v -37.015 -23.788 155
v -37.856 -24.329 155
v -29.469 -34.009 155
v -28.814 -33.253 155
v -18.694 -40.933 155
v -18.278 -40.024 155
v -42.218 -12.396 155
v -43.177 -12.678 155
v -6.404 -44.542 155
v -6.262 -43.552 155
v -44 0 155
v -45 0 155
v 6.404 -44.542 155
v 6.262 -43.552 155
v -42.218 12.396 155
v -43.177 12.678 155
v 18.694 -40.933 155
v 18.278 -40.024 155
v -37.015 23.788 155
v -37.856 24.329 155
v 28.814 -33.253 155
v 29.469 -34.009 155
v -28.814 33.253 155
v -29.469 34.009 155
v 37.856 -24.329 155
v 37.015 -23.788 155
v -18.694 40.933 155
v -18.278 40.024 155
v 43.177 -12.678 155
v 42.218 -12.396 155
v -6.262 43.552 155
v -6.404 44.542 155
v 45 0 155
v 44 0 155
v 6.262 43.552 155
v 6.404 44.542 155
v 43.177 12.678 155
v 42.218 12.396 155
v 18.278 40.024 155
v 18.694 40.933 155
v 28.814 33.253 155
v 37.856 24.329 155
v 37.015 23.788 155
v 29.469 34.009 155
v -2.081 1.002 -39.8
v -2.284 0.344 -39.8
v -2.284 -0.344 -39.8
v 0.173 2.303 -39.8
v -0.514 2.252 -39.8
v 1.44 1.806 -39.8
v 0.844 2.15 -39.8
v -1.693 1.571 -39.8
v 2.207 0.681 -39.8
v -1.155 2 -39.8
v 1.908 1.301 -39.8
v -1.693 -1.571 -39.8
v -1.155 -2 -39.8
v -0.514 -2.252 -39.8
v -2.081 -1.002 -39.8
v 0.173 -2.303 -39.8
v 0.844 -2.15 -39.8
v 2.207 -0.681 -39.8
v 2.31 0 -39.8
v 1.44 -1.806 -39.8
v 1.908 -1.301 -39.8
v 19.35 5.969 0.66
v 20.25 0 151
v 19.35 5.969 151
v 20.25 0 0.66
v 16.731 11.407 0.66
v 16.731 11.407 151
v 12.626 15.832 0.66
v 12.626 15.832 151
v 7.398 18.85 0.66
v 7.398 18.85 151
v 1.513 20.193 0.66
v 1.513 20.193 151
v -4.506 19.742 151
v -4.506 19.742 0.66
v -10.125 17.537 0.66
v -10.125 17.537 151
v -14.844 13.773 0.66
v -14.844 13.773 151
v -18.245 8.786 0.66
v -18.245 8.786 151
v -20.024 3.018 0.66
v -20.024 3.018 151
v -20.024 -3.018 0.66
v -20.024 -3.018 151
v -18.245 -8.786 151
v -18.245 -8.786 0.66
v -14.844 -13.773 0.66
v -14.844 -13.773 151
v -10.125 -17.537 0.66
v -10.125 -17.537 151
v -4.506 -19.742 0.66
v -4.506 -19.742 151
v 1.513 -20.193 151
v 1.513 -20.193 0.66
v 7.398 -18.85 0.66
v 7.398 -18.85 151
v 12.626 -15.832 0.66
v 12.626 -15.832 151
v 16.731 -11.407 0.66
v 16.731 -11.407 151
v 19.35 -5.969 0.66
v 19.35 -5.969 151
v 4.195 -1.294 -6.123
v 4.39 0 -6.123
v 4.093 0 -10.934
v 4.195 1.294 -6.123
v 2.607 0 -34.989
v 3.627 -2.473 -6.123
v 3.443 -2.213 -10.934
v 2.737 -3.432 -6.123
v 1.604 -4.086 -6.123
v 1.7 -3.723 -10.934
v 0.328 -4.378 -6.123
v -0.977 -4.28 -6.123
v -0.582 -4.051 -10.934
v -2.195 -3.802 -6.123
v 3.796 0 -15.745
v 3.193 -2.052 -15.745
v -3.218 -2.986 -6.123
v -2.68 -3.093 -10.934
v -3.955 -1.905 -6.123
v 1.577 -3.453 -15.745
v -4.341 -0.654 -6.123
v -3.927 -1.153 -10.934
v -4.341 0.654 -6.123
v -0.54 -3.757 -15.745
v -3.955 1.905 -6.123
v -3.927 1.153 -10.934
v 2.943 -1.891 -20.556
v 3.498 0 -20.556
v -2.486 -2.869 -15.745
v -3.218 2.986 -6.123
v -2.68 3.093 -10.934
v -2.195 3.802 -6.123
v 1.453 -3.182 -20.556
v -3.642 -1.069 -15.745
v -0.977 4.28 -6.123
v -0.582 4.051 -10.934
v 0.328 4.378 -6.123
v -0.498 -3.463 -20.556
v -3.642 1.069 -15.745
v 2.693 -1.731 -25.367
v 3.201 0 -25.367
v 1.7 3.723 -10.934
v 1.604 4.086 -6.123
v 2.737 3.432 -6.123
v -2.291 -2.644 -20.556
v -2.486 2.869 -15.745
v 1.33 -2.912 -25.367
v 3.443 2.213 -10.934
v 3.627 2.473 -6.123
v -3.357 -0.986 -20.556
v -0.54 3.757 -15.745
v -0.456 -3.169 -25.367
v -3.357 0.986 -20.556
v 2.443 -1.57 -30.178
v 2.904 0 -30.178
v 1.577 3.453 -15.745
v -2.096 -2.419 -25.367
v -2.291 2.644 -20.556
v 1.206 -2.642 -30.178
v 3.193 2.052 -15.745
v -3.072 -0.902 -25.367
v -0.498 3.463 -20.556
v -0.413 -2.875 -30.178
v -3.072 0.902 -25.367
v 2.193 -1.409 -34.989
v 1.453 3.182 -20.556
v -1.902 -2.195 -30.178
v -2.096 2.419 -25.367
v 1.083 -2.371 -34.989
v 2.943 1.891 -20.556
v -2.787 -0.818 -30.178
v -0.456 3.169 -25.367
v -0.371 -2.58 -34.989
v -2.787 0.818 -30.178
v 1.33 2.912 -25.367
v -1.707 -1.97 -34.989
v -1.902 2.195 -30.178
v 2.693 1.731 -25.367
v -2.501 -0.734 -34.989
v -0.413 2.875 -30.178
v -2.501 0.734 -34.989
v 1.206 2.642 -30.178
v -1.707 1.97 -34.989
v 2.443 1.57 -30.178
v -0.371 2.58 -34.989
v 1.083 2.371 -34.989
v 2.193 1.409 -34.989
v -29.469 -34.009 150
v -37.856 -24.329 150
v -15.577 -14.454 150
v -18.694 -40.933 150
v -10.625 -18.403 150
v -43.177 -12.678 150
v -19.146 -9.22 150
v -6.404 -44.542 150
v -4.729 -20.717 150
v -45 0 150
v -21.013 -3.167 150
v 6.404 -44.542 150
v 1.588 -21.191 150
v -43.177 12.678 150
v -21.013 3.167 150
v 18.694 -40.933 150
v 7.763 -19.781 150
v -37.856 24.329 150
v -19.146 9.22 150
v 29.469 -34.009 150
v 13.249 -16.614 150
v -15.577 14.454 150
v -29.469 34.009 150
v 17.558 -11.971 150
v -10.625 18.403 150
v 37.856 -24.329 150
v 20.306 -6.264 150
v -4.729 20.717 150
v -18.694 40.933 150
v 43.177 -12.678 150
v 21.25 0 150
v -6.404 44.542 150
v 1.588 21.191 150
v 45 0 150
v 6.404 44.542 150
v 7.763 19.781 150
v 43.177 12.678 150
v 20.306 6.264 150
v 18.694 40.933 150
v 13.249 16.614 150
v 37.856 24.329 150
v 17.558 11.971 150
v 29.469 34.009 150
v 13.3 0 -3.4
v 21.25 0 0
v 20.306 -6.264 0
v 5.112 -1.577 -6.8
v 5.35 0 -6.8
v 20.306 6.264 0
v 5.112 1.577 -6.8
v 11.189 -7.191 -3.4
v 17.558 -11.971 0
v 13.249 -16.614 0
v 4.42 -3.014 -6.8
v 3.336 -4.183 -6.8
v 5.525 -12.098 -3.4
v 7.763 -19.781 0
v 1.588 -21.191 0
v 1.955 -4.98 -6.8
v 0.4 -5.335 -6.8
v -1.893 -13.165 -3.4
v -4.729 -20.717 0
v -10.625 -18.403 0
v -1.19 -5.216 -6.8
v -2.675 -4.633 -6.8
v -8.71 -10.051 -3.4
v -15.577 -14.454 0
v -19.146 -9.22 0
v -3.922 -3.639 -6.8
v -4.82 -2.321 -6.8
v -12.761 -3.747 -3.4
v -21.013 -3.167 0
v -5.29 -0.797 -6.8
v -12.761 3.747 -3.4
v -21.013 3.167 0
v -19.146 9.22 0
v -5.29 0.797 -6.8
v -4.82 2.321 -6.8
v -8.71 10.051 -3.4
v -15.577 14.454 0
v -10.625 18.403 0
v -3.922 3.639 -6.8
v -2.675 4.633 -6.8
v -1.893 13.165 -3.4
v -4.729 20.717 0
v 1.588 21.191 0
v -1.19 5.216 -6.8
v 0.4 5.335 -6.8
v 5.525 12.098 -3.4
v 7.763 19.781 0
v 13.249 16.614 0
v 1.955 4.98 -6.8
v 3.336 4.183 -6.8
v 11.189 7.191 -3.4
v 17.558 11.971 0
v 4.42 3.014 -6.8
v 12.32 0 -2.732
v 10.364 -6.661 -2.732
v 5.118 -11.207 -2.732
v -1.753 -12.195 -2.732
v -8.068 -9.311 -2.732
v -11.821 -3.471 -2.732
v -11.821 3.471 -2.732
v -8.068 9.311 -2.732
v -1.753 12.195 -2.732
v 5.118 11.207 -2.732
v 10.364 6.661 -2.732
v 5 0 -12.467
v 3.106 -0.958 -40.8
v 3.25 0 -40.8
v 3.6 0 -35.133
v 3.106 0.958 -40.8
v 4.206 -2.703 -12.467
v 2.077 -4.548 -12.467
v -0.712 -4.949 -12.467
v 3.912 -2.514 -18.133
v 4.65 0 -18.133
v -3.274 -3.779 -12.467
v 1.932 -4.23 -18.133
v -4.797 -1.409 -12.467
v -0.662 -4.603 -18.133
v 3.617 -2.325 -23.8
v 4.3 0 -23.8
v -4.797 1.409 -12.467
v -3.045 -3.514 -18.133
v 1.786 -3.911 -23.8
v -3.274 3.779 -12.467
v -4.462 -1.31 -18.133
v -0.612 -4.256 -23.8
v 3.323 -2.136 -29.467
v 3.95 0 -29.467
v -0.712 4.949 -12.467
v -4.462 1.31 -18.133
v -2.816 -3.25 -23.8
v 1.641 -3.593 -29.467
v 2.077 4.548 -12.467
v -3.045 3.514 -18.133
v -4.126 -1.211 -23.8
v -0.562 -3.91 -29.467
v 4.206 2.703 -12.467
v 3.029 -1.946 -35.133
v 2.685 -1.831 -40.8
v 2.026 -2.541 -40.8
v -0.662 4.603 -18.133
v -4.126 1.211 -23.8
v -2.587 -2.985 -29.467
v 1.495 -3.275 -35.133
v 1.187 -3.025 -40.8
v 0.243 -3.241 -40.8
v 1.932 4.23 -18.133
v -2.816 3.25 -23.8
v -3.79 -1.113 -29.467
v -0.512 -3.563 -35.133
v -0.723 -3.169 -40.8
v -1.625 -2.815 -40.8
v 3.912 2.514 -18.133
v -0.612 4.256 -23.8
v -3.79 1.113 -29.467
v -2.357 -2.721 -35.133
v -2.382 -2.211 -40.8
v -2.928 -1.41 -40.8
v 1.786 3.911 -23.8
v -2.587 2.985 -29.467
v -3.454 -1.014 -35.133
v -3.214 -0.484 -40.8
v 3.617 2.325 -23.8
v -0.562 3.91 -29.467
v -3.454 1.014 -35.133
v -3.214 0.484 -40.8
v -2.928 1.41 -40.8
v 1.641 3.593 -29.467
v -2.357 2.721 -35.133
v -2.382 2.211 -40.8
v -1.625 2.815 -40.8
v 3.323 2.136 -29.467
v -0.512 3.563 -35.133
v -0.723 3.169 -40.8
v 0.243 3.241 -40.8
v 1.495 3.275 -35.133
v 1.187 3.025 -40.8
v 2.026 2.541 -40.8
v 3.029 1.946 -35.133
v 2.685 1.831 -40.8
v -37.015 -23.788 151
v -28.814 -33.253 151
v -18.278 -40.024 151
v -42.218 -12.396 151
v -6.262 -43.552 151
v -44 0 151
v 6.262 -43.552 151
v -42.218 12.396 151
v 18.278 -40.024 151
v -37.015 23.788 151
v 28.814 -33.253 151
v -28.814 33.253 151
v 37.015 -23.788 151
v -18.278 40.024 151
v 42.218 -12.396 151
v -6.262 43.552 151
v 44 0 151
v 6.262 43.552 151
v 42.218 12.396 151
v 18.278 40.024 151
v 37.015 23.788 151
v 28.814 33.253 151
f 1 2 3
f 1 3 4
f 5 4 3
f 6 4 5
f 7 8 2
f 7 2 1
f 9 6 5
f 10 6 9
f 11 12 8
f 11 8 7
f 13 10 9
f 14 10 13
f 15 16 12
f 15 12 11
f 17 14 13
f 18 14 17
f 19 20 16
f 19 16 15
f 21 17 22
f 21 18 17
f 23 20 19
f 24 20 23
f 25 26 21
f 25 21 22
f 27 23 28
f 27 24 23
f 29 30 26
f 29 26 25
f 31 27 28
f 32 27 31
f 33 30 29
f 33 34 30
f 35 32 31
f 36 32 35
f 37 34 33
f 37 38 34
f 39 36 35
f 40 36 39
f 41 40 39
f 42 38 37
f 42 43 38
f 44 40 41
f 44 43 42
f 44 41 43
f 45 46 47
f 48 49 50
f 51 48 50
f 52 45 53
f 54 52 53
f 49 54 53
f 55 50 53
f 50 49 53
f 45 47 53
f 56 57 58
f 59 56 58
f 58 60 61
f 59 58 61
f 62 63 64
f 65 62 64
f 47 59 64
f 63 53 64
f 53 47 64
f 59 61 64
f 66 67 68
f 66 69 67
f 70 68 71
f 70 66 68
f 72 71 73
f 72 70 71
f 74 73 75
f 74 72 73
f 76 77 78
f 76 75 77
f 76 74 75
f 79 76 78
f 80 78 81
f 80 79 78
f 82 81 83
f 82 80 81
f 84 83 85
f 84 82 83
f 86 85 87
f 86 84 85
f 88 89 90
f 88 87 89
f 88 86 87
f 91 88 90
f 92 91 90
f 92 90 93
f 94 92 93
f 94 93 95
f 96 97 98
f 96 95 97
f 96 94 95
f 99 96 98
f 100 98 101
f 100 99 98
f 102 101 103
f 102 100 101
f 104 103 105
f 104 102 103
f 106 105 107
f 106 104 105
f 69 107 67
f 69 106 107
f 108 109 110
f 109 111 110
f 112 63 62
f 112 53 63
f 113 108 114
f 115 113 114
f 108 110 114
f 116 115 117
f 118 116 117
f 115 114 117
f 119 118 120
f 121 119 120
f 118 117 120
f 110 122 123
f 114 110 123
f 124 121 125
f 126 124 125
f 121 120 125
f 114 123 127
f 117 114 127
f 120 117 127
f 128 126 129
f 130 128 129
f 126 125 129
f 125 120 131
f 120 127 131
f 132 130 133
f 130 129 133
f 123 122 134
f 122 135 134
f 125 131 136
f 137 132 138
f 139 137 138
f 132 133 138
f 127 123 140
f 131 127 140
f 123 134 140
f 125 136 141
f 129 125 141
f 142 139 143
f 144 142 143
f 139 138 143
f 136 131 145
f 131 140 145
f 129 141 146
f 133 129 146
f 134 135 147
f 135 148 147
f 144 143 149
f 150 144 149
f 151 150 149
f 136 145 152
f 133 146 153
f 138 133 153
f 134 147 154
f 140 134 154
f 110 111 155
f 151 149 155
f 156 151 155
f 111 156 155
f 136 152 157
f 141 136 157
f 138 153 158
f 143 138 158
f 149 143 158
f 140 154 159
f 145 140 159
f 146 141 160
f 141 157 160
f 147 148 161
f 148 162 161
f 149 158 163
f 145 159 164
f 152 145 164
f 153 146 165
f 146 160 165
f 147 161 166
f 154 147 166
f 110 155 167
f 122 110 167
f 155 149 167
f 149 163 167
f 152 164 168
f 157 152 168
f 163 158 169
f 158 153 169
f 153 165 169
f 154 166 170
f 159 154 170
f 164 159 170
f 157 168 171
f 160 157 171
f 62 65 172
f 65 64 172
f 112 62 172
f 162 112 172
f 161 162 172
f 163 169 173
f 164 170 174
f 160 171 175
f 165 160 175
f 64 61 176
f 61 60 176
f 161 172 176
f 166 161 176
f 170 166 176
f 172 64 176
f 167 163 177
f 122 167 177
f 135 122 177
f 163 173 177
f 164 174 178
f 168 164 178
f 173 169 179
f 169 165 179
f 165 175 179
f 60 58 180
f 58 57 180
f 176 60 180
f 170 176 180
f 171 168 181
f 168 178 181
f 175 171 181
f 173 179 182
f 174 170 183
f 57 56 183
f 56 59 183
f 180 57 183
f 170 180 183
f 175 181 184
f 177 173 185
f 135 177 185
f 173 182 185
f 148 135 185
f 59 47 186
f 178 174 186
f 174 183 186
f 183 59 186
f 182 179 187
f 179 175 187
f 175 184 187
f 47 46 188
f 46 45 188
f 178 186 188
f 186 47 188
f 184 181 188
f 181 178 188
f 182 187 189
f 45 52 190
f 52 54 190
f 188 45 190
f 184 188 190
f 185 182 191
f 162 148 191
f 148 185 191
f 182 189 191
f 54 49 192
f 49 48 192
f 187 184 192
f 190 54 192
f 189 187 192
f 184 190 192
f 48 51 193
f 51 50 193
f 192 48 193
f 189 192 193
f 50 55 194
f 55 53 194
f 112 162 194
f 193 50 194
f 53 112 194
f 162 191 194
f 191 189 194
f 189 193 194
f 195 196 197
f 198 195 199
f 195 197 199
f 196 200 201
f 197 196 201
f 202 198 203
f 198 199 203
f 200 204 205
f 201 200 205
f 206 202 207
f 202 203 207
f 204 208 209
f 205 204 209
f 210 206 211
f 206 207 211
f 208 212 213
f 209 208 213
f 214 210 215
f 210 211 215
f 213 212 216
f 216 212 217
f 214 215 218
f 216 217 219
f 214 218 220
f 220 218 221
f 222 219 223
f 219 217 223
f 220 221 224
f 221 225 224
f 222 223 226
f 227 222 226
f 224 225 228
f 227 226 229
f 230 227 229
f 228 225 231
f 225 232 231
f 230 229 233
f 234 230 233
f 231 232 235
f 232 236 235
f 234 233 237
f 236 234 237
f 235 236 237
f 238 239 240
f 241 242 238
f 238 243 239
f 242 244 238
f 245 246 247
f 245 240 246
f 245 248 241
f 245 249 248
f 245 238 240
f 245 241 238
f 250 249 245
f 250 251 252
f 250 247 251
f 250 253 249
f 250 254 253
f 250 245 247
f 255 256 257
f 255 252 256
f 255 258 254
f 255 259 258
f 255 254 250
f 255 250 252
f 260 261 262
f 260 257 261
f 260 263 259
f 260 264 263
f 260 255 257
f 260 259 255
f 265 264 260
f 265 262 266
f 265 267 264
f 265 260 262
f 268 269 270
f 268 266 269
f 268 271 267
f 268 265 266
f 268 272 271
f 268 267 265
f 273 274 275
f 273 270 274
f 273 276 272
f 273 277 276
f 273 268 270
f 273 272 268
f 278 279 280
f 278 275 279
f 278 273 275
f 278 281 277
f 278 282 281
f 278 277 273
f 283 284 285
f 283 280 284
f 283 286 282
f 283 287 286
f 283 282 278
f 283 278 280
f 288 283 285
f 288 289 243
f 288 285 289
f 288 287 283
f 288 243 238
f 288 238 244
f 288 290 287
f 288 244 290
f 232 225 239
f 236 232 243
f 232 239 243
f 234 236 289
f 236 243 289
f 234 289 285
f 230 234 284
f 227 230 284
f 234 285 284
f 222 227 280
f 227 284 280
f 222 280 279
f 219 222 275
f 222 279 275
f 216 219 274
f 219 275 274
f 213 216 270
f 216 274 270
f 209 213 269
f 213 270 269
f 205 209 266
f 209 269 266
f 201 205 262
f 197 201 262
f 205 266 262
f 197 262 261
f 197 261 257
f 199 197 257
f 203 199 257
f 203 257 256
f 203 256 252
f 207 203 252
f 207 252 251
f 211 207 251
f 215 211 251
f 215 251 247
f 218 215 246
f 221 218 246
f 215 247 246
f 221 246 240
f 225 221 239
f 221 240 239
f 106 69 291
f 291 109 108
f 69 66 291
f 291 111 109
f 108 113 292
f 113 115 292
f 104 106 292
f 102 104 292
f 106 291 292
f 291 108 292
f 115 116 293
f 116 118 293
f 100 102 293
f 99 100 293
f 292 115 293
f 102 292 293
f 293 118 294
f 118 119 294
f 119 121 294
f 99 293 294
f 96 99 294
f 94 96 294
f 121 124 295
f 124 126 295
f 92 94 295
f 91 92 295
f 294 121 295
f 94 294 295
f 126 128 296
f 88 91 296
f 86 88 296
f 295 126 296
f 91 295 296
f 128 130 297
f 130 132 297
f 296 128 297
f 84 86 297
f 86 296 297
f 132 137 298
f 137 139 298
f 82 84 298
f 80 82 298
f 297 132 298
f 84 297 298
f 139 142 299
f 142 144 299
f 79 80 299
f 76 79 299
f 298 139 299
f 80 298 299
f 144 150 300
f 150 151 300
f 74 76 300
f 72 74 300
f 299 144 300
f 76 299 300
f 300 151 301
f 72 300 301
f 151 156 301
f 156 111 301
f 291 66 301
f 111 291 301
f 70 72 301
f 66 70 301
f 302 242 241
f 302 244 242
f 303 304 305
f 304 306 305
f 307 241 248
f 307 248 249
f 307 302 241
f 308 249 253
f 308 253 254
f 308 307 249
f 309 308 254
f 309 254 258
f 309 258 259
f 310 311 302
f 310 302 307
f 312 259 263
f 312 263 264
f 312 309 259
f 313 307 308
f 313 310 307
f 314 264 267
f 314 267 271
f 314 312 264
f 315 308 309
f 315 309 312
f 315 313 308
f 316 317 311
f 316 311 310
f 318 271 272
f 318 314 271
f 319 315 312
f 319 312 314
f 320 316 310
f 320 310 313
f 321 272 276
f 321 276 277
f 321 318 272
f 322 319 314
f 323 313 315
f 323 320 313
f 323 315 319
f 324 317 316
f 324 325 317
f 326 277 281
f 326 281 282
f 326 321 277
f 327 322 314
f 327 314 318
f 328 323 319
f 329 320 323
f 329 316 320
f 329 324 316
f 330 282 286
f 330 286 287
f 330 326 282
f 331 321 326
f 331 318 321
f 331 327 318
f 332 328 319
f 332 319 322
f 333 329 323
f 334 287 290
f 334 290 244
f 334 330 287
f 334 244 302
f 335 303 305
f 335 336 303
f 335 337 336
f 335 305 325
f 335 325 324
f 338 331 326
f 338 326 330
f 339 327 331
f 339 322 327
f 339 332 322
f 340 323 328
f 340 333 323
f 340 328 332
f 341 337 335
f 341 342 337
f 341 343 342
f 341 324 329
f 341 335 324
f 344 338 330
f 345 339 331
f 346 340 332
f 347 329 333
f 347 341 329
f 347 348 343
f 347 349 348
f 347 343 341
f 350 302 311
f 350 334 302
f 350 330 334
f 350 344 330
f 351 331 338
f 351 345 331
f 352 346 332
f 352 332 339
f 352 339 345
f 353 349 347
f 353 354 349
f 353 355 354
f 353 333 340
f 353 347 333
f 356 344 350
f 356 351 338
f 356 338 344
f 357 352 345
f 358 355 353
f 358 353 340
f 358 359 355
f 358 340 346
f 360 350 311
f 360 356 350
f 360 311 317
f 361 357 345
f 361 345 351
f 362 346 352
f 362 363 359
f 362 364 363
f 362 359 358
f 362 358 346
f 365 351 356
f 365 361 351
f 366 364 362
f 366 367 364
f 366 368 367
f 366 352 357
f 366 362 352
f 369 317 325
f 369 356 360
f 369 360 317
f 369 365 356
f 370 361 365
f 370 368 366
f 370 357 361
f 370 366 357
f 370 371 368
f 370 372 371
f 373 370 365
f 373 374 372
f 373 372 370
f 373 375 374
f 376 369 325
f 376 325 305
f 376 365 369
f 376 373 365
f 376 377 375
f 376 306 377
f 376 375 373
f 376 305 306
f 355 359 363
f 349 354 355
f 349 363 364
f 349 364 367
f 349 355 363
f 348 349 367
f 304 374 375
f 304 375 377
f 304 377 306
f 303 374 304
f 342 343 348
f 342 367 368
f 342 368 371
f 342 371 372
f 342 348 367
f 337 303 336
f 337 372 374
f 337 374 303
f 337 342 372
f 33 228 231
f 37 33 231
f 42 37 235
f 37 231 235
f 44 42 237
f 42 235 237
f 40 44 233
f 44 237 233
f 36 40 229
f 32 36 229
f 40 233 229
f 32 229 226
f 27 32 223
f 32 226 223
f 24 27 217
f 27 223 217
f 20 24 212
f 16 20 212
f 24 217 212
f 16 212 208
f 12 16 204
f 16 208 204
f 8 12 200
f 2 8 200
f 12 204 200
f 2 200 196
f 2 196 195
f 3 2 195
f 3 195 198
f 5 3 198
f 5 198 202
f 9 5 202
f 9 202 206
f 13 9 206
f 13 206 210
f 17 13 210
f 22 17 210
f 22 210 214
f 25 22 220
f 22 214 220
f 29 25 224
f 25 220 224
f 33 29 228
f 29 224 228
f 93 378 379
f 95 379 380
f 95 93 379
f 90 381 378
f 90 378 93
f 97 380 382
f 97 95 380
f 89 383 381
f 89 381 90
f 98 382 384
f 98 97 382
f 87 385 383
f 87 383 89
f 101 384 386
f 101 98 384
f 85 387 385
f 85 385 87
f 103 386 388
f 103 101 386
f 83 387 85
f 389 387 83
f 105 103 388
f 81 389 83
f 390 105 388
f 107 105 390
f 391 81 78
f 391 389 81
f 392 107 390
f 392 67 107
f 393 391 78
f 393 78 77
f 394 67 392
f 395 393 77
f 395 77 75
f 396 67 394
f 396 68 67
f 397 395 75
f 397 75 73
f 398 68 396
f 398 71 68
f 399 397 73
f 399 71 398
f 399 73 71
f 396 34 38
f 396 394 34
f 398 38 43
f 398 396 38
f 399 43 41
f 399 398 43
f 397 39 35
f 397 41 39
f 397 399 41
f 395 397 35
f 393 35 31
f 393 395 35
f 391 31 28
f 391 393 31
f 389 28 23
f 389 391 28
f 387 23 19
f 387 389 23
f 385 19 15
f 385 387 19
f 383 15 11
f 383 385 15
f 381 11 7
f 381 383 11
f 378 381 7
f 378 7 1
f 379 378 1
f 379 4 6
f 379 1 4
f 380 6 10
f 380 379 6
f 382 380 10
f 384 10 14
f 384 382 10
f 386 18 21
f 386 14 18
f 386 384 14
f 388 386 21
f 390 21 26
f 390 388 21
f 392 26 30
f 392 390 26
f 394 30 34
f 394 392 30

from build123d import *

# Parameters (mm, degrees)
SKETCH1_R           = 21.25
BOSS_EXTRUDE1_DEPTH = 150
SKETCH2_R           = 45
BOSS_EXTRUDE2_DEPTH = 5
SHELL1_T            = -1


with BuildPart() as part:
    # Sketch1 → Boss-Extrude1 (new body)
    with BuildSketch(Plane.XY):
        Circle(SKETCH1_R)
    extrude(amount=BOSS_EXTRUDE1_DEPTH)

    # Sketch2 → Boss-Extrude2 (add)
    with BuildSketch(Plane.XY.offset(150)):
        Circle(SKETCH2_R)
    extrude(amount=BOSS_EXTRUDE2_DEPTH)

    # Sketch4 → Revolve1 (revolve)
    with BuildSketch(Plane(origin=(0, 0, 0), x_dir=(0, 0, -1), z_dir=(1, 0, 0)), mode=Mode.PRIVATE) as revolve1_sk:
        Polygon((0, 21.25), (6.8, 5.35), (40.8, 3.25), (40.8, 0), (0, 0), align=None)
    revolve(revolve1_sk.sketch.rotate(Axis((0, 0, 0), (0, 0, -1)), 90), axis=Axis((0, 0, 0), (0, 0, -1)))

    # Shell1
    shell1_openings = [part.faces().sort_by_distance(p)[0] for p in [
        (0, 0, 155),
    ]]
    offset(amount=SHELL1_T, openings=shell1_openings, kind=Kind.INTERSECTION)


solid = part.part
